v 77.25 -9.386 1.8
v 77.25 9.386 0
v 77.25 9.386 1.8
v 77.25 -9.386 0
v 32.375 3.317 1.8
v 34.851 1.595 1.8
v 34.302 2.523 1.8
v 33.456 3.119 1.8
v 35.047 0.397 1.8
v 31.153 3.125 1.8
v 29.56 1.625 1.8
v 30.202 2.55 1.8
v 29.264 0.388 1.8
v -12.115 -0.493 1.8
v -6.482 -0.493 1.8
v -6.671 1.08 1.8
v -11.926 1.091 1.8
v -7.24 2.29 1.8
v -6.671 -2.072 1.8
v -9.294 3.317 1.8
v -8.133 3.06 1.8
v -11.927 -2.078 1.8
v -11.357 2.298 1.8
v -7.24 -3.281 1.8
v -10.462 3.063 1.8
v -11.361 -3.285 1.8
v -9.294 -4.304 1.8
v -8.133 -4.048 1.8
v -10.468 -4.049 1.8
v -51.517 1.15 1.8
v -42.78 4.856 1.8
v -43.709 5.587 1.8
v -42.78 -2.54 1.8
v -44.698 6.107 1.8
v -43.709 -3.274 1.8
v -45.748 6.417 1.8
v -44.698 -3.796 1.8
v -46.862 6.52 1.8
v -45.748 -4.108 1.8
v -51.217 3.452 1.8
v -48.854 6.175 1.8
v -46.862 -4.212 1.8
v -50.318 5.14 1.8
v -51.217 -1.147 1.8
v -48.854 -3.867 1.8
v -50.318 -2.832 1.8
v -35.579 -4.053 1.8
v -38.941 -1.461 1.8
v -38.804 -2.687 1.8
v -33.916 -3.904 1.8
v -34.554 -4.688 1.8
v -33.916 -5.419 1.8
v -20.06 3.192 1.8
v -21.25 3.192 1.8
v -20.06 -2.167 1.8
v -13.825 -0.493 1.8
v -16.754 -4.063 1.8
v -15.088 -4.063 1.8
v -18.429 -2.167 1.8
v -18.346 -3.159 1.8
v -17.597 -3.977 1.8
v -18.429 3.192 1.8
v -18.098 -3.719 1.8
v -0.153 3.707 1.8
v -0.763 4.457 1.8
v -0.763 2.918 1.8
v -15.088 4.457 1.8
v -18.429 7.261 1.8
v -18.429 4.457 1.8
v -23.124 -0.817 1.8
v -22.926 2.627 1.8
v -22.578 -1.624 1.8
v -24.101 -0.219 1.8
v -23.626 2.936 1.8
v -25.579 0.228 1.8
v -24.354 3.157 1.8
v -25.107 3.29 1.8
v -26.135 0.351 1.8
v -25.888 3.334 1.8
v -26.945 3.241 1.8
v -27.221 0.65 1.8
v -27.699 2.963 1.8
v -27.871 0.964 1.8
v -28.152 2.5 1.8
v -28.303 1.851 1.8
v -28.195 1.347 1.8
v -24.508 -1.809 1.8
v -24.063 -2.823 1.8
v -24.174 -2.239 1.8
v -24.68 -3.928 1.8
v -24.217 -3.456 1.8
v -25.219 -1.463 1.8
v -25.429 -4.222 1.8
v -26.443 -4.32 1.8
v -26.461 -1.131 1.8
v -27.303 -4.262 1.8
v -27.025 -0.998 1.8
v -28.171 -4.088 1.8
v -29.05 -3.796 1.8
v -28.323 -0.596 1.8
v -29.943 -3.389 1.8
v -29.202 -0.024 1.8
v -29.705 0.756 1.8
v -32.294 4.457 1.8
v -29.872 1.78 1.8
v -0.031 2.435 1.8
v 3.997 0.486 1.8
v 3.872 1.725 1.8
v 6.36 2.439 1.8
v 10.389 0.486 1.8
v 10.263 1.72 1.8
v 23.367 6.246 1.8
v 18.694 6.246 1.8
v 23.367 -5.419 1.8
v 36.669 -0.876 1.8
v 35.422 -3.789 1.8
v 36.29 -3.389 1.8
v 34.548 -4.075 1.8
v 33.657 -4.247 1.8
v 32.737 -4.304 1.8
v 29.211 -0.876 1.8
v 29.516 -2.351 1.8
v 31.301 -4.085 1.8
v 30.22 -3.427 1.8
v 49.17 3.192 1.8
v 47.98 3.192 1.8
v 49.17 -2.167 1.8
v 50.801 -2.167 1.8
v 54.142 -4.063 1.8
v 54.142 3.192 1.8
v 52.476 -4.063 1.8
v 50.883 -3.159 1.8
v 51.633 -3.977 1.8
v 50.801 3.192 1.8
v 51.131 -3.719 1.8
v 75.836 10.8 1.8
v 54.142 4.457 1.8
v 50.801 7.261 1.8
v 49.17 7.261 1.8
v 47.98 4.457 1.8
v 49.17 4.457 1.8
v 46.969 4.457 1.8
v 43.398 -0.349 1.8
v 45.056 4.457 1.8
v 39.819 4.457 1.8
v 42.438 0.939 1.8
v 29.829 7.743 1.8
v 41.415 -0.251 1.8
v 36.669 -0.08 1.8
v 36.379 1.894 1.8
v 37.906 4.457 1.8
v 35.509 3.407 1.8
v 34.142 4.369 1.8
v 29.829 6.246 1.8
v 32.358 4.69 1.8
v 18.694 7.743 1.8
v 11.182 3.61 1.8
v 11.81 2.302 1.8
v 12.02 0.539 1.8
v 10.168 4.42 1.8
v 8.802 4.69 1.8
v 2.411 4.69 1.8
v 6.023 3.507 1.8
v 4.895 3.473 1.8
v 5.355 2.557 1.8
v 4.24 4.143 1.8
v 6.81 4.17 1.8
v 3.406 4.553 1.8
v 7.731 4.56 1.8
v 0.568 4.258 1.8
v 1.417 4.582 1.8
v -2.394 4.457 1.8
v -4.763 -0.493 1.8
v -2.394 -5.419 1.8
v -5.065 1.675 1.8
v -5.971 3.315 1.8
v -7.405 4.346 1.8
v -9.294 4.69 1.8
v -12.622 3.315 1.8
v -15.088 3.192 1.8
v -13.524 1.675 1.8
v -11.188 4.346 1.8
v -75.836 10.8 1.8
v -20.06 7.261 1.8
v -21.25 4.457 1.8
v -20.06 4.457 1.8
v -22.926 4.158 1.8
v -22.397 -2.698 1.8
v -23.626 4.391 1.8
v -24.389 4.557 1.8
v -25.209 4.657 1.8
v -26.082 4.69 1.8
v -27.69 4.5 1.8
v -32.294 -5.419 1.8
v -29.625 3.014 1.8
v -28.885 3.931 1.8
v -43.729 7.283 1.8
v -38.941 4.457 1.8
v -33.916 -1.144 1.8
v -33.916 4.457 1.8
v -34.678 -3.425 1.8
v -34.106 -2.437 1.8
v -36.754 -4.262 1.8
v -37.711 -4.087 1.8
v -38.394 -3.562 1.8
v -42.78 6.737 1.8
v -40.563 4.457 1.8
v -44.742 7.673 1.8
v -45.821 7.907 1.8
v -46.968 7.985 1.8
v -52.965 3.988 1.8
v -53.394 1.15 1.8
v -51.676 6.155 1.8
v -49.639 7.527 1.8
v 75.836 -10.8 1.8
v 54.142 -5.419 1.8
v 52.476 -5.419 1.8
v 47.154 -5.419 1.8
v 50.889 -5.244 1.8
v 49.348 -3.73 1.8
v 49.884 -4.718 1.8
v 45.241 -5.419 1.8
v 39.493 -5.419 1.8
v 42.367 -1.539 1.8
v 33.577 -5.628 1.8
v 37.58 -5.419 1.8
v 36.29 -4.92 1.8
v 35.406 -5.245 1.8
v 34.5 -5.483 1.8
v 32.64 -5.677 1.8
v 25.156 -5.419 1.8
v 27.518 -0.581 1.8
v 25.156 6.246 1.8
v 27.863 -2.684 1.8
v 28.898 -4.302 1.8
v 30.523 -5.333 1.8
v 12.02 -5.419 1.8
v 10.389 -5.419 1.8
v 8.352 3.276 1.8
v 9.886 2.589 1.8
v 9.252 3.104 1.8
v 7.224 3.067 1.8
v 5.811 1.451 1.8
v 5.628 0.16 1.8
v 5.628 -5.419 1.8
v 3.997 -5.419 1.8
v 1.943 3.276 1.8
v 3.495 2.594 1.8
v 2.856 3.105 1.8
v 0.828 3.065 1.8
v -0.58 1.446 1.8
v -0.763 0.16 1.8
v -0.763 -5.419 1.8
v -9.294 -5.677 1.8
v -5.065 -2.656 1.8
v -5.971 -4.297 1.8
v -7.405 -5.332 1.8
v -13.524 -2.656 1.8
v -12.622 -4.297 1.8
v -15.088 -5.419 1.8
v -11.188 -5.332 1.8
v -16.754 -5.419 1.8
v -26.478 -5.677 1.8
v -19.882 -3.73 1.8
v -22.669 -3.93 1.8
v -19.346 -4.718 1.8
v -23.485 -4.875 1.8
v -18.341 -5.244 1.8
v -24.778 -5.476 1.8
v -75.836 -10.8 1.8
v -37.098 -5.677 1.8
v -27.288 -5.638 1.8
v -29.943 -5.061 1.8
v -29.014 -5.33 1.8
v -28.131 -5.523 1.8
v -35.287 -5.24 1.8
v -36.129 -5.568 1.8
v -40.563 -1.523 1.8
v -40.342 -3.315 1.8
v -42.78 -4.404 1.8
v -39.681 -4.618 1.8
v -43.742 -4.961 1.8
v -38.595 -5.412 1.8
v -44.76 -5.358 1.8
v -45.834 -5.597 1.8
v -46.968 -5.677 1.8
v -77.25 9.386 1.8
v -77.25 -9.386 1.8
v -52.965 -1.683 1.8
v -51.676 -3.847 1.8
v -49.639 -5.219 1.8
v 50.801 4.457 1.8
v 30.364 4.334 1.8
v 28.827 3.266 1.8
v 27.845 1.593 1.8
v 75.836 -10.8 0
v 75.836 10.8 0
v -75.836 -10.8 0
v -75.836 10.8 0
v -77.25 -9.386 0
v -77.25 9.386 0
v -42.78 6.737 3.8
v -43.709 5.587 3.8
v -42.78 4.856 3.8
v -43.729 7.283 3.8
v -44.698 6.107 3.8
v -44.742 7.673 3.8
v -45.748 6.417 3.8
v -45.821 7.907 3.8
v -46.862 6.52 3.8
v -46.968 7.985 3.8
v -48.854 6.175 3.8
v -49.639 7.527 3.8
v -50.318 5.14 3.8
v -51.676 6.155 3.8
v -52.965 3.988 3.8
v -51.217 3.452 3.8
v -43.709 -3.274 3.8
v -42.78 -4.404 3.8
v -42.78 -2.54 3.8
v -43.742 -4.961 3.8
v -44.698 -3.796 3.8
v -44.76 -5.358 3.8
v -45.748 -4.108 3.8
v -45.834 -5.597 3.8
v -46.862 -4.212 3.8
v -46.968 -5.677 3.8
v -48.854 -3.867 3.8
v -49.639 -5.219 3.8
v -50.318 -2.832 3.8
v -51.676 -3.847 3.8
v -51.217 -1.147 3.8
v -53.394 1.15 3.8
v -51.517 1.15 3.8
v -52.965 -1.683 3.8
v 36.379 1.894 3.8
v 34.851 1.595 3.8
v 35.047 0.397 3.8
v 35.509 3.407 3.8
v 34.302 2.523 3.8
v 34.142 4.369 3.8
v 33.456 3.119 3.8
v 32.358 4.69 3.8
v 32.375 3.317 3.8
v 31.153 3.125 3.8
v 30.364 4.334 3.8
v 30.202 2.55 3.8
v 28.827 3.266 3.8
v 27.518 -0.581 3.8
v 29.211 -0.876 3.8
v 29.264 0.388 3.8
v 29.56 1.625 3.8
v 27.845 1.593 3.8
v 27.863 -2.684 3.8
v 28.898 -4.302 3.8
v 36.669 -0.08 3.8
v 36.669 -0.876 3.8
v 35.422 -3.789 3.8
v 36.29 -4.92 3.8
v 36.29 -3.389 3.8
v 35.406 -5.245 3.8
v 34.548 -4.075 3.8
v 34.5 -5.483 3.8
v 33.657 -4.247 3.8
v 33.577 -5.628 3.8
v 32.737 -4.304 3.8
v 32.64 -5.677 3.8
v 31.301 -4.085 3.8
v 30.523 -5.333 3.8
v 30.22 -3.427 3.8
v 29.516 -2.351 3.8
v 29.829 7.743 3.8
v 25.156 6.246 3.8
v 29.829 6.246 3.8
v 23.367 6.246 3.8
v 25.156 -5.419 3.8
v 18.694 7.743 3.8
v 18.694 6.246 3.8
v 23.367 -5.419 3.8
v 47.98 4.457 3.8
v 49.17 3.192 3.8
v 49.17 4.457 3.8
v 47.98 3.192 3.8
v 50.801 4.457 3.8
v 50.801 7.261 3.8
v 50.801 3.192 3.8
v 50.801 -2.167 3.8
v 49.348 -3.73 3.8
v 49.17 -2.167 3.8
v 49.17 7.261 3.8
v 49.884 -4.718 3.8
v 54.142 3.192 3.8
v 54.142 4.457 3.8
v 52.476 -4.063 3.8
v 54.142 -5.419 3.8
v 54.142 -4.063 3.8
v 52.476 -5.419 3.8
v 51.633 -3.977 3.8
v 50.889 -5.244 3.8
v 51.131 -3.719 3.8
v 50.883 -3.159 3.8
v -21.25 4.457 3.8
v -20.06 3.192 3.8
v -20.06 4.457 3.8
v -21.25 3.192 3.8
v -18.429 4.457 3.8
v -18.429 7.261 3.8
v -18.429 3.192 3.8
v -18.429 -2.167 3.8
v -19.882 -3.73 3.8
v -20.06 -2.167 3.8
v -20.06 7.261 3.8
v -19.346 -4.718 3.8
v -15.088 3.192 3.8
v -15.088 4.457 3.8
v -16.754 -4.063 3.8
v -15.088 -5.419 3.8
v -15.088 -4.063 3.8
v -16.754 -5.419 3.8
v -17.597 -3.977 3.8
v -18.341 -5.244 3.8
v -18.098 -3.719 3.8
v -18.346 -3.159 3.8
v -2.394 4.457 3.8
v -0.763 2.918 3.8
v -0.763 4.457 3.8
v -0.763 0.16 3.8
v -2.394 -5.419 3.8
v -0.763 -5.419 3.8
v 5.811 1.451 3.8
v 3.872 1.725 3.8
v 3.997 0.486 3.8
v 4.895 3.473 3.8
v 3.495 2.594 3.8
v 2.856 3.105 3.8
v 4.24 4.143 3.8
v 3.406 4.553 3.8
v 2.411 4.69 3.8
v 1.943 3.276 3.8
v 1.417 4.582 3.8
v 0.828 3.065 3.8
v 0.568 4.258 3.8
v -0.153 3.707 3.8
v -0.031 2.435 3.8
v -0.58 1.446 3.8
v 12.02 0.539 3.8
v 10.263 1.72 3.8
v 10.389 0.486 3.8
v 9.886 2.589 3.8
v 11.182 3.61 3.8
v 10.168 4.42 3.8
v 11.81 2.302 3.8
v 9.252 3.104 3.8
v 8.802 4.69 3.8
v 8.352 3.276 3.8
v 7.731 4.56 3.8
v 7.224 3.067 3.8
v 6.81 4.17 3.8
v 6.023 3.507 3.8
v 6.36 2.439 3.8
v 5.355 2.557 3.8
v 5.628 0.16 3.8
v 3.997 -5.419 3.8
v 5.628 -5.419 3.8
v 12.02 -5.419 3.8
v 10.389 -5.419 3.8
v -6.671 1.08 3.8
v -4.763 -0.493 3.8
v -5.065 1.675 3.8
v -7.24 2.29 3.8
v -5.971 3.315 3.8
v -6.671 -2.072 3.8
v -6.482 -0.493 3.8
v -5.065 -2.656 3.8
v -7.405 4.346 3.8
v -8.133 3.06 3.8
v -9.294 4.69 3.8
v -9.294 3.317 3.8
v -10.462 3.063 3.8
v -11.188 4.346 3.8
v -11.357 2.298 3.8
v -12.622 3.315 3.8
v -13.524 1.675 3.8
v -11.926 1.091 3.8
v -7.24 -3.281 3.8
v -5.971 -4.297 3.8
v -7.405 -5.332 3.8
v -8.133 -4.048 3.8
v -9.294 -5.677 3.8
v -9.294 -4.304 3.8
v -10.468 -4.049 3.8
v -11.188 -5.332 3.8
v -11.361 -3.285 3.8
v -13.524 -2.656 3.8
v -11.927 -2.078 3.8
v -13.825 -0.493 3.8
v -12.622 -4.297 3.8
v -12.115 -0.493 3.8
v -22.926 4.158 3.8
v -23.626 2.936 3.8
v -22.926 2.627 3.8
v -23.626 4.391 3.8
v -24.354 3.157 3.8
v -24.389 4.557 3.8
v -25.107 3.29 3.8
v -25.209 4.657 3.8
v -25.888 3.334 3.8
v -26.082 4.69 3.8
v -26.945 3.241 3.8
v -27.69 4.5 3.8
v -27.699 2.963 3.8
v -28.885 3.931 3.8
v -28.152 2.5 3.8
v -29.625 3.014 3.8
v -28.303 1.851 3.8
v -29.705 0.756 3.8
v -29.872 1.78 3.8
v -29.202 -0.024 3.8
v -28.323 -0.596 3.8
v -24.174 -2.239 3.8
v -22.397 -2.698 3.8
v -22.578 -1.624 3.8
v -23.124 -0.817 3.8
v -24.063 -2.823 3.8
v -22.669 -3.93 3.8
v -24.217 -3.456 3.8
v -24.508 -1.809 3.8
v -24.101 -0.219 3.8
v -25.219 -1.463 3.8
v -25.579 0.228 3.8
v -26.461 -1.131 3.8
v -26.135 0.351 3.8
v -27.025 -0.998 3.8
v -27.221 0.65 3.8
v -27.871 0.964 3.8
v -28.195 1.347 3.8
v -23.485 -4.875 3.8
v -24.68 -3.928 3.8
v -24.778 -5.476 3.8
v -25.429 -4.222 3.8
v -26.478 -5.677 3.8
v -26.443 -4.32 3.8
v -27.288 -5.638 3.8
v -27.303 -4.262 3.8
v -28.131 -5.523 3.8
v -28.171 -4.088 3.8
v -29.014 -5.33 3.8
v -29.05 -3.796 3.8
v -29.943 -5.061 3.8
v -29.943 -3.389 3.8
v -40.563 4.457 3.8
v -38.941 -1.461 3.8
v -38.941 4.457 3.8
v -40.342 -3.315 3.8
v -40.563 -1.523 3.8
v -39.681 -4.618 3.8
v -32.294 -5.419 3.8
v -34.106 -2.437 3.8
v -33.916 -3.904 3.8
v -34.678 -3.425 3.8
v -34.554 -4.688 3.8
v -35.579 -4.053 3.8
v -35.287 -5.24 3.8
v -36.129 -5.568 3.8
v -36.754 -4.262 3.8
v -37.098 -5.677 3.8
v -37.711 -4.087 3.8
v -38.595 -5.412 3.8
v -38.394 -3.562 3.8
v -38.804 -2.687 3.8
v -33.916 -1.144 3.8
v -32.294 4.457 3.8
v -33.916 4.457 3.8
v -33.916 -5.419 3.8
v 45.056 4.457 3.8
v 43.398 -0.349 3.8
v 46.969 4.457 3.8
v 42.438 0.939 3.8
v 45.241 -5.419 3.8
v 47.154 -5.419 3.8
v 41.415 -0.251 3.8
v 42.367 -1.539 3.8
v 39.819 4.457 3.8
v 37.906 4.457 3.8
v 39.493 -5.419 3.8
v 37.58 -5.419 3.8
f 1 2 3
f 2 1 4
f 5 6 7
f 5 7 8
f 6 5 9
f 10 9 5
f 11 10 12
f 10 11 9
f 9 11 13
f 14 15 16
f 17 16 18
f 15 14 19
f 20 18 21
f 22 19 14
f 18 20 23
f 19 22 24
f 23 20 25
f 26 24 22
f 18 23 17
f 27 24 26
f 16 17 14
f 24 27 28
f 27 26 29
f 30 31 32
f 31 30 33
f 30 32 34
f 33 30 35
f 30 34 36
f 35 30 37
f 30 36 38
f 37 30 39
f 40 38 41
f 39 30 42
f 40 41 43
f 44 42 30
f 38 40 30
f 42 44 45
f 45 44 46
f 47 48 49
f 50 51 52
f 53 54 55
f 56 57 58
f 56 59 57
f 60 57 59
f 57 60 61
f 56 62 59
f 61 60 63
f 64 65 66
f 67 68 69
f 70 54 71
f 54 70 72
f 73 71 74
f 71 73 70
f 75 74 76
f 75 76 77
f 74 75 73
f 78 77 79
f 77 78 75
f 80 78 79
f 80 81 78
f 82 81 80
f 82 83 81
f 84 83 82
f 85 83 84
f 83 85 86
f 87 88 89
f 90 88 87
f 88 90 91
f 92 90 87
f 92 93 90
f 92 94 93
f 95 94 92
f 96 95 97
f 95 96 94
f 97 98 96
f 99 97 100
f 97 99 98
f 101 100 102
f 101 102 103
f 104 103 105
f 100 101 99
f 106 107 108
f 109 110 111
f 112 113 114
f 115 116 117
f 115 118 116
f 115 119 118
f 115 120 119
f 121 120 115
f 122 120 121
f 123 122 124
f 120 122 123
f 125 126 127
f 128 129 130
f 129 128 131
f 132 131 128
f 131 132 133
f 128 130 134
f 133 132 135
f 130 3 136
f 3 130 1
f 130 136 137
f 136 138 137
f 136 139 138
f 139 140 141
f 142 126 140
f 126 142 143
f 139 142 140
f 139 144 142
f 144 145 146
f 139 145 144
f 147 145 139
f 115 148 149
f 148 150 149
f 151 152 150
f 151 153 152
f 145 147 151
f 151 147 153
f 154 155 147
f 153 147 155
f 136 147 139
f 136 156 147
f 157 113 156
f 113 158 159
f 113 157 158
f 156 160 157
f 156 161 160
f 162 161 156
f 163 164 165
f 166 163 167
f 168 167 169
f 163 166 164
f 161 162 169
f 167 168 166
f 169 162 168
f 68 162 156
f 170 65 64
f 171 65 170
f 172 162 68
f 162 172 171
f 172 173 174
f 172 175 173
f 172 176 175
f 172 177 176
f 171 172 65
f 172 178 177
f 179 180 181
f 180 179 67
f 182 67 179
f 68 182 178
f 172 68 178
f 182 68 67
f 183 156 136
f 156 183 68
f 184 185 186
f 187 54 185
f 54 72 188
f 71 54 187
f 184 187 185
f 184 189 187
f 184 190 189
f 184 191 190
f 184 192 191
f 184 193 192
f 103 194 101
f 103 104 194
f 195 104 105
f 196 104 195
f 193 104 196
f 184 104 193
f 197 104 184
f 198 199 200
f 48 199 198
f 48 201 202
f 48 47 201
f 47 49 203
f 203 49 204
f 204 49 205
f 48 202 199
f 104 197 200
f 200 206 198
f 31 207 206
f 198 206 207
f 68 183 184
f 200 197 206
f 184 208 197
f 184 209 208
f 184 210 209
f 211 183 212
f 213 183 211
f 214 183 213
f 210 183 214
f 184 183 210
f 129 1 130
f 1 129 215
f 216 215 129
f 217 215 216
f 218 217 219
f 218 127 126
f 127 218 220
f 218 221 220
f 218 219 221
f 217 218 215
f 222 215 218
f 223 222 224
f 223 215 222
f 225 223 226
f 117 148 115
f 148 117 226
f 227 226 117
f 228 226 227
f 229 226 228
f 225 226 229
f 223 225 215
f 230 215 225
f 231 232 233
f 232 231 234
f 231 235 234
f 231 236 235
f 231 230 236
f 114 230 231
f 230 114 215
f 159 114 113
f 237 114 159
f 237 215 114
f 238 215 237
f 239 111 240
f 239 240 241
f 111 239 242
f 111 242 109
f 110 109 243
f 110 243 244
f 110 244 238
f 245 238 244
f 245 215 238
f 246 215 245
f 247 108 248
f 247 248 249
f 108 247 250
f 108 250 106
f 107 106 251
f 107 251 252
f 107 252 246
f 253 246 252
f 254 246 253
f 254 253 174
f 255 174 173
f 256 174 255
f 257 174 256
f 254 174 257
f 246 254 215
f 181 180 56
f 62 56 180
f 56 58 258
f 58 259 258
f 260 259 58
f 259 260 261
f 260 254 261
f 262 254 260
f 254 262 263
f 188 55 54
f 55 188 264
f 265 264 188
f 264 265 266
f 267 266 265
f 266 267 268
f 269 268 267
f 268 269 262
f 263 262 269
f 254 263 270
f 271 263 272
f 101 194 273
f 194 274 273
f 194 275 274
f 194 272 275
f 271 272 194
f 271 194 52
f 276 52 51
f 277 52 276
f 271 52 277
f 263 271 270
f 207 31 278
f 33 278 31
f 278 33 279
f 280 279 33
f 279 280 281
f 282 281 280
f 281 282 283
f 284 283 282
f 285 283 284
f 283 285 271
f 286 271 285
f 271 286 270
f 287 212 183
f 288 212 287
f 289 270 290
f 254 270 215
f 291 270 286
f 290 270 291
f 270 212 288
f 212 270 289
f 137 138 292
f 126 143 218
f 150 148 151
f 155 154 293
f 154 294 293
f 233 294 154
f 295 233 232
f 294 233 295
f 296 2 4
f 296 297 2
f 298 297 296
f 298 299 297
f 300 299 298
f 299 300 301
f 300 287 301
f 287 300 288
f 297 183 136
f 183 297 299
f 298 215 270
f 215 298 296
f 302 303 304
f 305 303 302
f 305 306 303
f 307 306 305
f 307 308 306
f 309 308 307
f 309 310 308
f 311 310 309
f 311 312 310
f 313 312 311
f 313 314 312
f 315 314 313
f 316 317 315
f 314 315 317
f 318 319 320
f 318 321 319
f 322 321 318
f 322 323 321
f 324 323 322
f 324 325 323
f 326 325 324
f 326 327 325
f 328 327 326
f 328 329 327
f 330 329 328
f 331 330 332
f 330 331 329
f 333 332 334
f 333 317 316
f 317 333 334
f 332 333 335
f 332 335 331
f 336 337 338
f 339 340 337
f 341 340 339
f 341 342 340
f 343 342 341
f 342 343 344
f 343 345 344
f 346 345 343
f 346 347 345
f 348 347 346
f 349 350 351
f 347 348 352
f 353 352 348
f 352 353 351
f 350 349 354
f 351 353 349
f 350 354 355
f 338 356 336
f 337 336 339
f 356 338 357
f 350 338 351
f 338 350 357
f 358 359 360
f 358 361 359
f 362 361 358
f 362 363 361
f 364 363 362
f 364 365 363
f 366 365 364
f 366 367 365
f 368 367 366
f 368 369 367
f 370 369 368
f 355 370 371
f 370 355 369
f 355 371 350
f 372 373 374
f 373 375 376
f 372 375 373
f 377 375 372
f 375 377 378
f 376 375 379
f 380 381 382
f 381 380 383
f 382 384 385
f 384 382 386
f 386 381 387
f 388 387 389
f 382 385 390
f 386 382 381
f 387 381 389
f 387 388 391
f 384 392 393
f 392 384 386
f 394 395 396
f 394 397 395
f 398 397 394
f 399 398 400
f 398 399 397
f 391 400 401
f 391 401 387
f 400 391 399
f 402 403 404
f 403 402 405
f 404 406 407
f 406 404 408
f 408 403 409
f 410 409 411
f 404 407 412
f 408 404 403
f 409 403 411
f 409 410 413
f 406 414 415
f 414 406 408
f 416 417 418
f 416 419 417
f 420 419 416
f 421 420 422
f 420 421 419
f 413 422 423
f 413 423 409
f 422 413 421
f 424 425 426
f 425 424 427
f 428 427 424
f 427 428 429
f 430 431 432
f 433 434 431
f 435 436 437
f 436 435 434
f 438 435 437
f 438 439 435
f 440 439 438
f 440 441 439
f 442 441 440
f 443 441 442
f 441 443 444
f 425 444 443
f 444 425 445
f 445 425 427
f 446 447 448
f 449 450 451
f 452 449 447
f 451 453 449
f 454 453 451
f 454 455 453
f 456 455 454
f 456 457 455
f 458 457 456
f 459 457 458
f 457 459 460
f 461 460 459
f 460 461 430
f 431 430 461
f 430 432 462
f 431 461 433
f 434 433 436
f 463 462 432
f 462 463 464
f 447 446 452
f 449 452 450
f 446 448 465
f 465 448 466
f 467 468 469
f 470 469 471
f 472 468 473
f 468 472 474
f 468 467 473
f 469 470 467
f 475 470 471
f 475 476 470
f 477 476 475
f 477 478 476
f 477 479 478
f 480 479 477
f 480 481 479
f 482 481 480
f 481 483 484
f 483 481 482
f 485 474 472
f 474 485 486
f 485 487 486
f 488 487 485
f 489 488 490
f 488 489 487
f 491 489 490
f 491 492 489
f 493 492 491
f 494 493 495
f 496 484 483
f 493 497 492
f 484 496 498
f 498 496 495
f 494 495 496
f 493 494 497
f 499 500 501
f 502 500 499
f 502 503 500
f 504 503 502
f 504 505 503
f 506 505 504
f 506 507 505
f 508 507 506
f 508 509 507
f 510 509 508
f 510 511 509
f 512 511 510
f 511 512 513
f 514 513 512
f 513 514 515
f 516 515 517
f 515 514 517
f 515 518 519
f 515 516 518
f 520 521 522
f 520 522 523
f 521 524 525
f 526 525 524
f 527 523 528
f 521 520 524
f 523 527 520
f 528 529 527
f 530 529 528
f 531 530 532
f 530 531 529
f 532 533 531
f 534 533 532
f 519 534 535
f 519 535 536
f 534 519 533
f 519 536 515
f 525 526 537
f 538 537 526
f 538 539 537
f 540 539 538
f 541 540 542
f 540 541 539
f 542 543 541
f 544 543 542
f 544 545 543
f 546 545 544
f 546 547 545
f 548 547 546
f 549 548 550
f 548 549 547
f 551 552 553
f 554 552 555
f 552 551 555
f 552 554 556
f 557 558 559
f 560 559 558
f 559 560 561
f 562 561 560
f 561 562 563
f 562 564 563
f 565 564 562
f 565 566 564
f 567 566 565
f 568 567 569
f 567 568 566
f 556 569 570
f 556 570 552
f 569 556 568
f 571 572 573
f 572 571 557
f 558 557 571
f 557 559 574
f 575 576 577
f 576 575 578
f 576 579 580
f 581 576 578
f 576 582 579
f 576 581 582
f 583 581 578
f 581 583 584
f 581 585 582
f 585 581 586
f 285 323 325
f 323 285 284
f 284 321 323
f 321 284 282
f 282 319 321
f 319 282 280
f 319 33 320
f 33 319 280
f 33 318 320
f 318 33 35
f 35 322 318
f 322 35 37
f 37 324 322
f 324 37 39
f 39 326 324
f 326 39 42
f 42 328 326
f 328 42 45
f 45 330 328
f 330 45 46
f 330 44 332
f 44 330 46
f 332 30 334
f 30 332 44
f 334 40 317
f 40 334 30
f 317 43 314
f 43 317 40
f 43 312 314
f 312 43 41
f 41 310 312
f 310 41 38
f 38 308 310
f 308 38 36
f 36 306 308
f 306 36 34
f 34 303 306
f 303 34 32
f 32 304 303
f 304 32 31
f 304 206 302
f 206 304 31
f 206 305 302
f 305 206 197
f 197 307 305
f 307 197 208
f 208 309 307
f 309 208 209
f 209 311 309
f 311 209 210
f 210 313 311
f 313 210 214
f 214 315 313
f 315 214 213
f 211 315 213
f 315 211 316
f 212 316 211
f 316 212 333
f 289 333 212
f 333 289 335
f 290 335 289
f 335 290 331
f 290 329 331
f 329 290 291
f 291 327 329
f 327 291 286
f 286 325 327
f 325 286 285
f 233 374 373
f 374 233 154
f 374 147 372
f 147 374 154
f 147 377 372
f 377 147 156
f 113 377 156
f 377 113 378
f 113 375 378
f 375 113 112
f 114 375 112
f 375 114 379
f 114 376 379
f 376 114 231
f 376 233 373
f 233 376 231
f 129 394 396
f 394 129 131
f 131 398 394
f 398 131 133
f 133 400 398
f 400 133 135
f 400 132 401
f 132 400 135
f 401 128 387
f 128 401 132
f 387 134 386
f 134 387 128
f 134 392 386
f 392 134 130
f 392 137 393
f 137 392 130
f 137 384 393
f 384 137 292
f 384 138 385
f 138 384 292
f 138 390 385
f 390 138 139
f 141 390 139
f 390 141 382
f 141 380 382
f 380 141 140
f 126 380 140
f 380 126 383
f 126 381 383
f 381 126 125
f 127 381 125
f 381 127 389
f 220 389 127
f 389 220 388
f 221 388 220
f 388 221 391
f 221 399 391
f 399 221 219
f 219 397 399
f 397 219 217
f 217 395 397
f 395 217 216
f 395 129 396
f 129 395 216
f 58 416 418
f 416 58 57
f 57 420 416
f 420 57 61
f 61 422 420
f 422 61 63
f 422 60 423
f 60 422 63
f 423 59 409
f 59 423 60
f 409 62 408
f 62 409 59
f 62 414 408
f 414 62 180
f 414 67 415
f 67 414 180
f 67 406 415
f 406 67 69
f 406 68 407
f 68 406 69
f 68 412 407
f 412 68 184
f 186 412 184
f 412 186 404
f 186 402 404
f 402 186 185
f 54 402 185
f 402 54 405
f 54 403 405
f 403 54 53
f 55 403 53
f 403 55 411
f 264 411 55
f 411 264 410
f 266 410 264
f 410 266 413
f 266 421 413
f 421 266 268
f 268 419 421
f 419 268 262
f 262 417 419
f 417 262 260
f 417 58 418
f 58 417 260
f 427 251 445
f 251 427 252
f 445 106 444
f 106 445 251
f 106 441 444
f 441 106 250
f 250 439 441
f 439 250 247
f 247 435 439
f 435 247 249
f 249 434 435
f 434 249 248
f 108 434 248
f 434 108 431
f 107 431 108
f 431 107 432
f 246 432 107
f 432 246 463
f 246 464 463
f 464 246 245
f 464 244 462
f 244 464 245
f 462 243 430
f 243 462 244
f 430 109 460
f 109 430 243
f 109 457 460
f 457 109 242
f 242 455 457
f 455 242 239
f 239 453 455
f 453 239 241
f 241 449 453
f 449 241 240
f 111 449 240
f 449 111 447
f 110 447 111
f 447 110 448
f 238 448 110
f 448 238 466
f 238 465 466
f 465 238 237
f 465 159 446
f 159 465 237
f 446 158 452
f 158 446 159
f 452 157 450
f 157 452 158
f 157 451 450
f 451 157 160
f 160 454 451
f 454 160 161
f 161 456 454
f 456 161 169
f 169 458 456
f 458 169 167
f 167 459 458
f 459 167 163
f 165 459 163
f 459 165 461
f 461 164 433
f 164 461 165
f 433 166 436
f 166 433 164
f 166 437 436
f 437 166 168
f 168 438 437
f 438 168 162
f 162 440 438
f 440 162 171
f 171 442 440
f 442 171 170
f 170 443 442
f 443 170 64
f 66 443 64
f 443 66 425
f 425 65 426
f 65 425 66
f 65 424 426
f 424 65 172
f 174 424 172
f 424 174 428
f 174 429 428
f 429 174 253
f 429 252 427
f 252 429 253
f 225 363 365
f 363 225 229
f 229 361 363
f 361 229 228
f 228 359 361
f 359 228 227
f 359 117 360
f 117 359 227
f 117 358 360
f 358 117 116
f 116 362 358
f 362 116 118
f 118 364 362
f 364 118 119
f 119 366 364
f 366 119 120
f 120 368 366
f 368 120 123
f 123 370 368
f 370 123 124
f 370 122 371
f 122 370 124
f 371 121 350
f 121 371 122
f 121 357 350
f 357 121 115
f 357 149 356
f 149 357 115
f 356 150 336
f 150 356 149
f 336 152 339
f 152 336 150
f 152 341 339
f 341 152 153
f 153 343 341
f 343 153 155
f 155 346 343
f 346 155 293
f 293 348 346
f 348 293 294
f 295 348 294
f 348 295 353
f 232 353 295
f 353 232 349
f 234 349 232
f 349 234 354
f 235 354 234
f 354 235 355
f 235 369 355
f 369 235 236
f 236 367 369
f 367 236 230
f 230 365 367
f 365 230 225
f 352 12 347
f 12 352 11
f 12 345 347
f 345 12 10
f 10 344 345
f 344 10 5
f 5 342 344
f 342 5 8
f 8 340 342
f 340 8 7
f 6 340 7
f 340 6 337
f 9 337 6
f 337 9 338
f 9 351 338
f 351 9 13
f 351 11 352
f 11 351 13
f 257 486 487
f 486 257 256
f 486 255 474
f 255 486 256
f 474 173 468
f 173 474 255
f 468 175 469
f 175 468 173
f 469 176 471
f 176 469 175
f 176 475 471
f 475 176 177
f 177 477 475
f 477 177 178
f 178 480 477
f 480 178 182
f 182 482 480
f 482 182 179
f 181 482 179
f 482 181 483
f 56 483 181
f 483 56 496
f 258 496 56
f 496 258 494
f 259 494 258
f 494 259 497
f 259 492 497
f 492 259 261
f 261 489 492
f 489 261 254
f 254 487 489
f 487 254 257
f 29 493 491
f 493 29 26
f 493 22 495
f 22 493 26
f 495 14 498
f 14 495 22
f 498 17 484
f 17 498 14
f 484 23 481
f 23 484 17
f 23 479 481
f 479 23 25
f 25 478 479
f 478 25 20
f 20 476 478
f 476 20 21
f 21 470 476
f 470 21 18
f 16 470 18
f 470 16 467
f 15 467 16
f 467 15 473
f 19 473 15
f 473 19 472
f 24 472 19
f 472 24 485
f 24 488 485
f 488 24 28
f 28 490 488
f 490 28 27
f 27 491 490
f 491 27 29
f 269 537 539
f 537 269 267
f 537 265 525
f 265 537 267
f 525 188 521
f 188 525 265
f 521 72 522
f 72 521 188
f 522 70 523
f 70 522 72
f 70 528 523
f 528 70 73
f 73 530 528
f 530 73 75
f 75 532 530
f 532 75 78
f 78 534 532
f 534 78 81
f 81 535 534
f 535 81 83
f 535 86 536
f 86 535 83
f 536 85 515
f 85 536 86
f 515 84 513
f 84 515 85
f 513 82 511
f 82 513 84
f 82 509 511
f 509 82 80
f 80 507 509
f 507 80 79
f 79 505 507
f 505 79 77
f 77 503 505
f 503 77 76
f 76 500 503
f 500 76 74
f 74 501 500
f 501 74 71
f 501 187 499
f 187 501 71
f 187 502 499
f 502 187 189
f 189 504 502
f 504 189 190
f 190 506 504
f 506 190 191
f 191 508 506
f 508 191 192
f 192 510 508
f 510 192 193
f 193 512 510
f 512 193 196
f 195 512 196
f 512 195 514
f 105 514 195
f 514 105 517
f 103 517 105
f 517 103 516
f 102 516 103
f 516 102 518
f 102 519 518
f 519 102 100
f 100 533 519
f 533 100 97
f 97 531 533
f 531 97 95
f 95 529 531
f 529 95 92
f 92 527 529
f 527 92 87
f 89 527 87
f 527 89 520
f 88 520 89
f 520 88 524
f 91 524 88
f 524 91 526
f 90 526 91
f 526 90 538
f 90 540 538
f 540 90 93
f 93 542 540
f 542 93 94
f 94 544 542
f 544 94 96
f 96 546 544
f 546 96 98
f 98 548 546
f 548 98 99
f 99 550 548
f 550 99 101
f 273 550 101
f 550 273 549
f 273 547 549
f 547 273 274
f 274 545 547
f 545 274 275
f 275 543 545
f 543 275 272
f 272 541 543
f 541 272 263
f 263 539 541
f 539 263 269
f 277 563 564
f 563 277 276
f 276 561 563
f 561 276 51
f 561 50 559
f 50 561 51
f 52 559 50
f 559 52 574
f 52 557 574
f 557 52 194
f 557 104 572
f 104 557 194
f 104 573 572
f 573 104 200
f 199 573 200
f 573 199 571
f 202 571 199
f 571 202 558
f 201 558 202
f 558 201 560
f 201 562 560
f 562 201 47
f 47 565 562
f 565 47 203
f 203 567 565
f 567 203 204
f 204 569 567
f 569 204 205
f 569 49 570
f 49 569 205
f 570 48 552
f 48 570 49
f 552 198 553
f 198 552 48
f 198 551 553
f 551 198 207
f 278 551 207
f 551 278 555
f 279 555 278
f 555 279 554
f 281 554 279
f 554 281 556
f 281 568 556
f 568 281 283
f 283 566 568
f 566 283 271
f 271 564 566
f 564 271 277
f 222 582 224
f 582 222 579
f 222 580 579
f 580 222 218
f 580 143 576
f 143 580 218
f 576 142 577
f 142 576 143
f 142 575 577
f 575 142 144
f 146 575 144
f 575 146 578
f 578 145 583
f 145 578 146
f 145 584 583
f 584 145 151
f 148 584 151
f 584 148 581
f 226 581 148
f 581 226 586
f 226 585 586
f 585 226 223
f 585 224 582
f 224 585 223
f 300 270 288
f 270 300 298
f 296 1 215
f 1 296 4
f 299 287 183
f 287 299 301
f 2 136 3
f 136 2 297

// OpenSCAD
// preview[view:south, tilt:top]

/* [General Settings] */

label_text = "Custom Text";
//Cut/Extrude distance (mm). A negative value creates inset text, a positive value creates extruded text.
extrude_distance = 2; // [-1.8:0.1:4.1]

// Does not apply to text that is cut all the way through the label, which is hardcoded to use a stencil font (Allerta Stencil). When set to Braille, the "#" symbol can be used for the dots-3456 number indicator. 
font_type = 5; //[6:Braille, 5:Allerta (Sans Serif), 4:Roboto (Sans Serif), 3:Delius (Handwriting), 2:Courgette (Handwriting), 1:Comfortaa (Display), 0:Righteous (Display)] 

font_size = 13; //[8:0.5:15]

/* [Braille Settings] */
//Dot radius and height (mm). The rest of the Braille parameters are set according to the Marburg Medium Braille font standard
dot_radius = 0.8; // [0.5:0.1:1]
//Extra offset from left (mm).
braille_x_offset = 0;
//Extra offset from top (mm).
braille_y_offset = 0;


/* [Adjustments] */
//Adjust these parameters if the label has trouble fitting in the groove of the 3D printed handle. (All mm)
label_thickness = 1.8; // [1.4:0.1:1.8]
label_width = 154.5;
label_height = 21.6;
chamfer_size = 2;


/* [Hidden] */
$fn = 10;
//More braille settings
spacing = 2.5;
distance = 3.5 + spacing;
char_count = len(label_text);

//Sans Serif fonts

module text_cut_through(input_text) { //Converts text for cutting all the way through label (uses Allerta stencil font)
	linear_extrude(height = (-extrude_distance)+0.02) {
		text(label_text, size = font_size, font = "Allerta Stencil:style=Regular", halign = "center", valign = "center");
	}
}

module text_cutter_allerta(input_text) { //Converts text (Allerta font) from 2D to 3D for cutting
	linear_extrude(height = (-extrude_distance)+0.02) {
		text(label_text, size = font_size, font = "Allerta:style=Regular", halign = "center", valign = "center");
	}
}

module text_extruder_allerta(input_text) { //Converts text (Allerta font) from 2D to 3D for extrusion
	linear_extrude(height = extrude_distance) {
		text(label_text, size = font_size, font = "Allerta:style=Regular", halign = "center", valign = "center");
	}
}

module text_cutter_roboto(input_text) { //Converts text (Roboto font) from 2D to 3D for cutting
	linear_extrude(height = (-extrude_distance)+0.02) {
		text(label_text, size = font_size, font = "Roboto:style=Regular", halign = "center", valign = "center");
	}
}

module text_extruder_roboto(input_text) { //Converts text (Roboto font) from 2D to 3D for extrusion
	linear_extrude(height = extrude_distance) {
		text(label_text, size = font_size, font = "Roboto:style=Regular", halign = "center", valign = "center");
	}
}

//Handwriting fonts

module text_cutter_delius(input_text) { //Converts text (Delius font) from 2D to 3D for cutting
	linear_extrude(height = (-extrude_distance)+0.02) {
		text(label_text, size = font_size, font = "Delius:style=Regular", halign = "center", valign = "center");
	}
}

module text_extruder_delius(input_text) { //Converts text (Delius font) from 2D to 3D for extrusion
	linear_extrude(height = extrude_distance) {
		text(label_text, size = font_size, font = "Delius:style=Regular", halign = "center", valign = "center");
	}
}

module text_cutter_courgette(input_text) { //Converts text (Courgette font) from 2D to 3D for cutting
	linear_extrude(height = (-extrude_distance)+0.02) {
		text(label_text, size = font_size, font = "Courgette:style=Regular", halign = "center", valign = "center");
	}
}

module text_extruder_courgette(input_text) { //Converts text (Courgette font) from 2D to 3D for extrusion
	linear_extrude(height = extrude_distance) {
		text(label_text, size = font_size, font = "Courgette:style=Regular", halign = "center", valign = "center");
	}
}

//Display fonts

module text_cutter_comfortaa(input_text) { //Converts text (Comfortaa font) from 2D to 3D for cutting
	linear_extrude(height = (-extrude_distance)+0.02) {
		text(label_text, size = font_size, font = "Comfortaa:style=Regular", halign = "center", valign = "center");
	}
}

module text_extruder_comfortaa(input_text) { //Converts text (Comfortaa font) from 2D to 3D for extrusion
	linear_extrude(height = extrude_distance) {
		text(label_text, size = font_size, font = "Comfortaa:style=Regular", halign = "center", valign = "center");
	}
}

module text_cutter_righteous(input_text) { //Converts text (Righteous font) from 2D to 3D for cutting
	linear_extrude(height = (-extrude_distance)+0.02) {
		text(label_text, size = font_size, font = "Righteous:style=Regular", halign = "center", valign = "center");
	}
}

module text_extruder_righteous(input_text) { //Converts text (Righteous font) from 2D to 3D for extrusion
	linear_extrude(height = extrude_distance) {
		text(label_text, size = font_size, font = "Righteous:style=Regular", halign = "center", valign = "center");
	}
}


/*
Braille Module
http://creativecommons.org/licenses/by/3.0/
*/

module letter(bitmap) {
	row_size = 2;
	col_size = 3;
	bitmap_size = row_size * col_size;
	
	function loc_x(loc) = floor(loc / row_size) * spacing + spacing;
	function loc_y(loc) = loc % row_size * spacing  + (distance-spacing)/2;

	for (loc = [0:bitmap_size - 1]) {
		if (bitmap[loc] != 0) {
			union() {
				translate(v = [loc_x(loc), loc_y(loc), 0]) {
					sphere(dot_radius, center = true);
				}
			}
		}
	}
}

module braille_char(char) {
	if (char == "A" || char == "a") {
		letter([
			1,0,
			0,0,
			0,0
		]);
	} else if (char == "B" || char == "b") {
		letter([
			1,0,
			1,0,
			0,0
		]);
	} else if (char == "C" || char == "c") {
		letter([
			1,1,
			0,0,
			0,0
		]);
	} else if (char == "D" || char == "d") {
		letter([
			1,1,
			0,1,
			0,0
		]);
	} else if (char == "E" || char == "e") {
		letter([
			1,0,
			0,1,
			0,0
		]);
	} else if (char == "F" || char == "f") {
		letter([
			1,1,
			1,0,
			0,0
		]);
	} else if (char == "G" || char == "g") {
		letter([
			1,1,
			1,1,
			0,0
		]);
	} else if (char == "H" || char == "h") {
		letter([
			1,0,
			1,1,
			0,0
		]);
	} else if (char == "I" || char == "i") {
		letter([
			0,1,
			1,0,
			0,0
		]);
	} else if (char == "J" || char == "j") {
		letter([
			0,1,
			1,1,
			0,0
		]);
	} else if (char == "K" || char == "k") {
		letter([
			1,0,
			0,0,
			1,0
		]);
	} else if (char == "L" || char == "l") {
		letter([
			1,0,
			1,0,
			1,0
		]);
	} else if (char == "M" || char == "m") {
		letter([
			1,1,
			0,0,
			1,0
		]);
	} else if (char == "N" || char == "n") {
		letter([
			1,1,
			0,1,
			1,0
		]);
	} else if (char == "O" || char == "o") {
		letter([
			1,0,
			0,1,
			1,0
		]);
	} else if (char == "P" || char == "p") {
		letter([
			1,1,
			1,0,
			1,0
		]);
	} else if (char == "Q" || char == "q") {
		letter([
			1,1,
			1,1,
			1,0
		]);
	} else if (char == "R" || char == "r") {
		letter([
			1,0,
			1,1,
			1,0
		]);
	} else if (char == "S" || char == "s") {
		letter([
			0,1,
			1,0,
			1,0
		]);
	} else if (char == "T" || char == "t") {
		letter([
			0,1,
			1,1,
			1,0
		]);
	} else if (char == "U" || char == "u") {
		letter([
			1,0,
			0,0,
			1,1
		]);
	} else if (char == "V" || char == "v") {
		letter([
			1,0,
			1,1,
			1,0
		]);
	} else if (char == "W" || char == "w") {
		letter([
			0,1,
			1,1,
			0,1
		]);
	} else if (char == "X" || char == "x") {
		letter([
			1,1,
			0,0,
			1,1
		]);
	} else if (char == "Y" || char == "y") {
		letter([
			1,1,
			0,1,
			1,1
		]);
	} else if (char == "Z" || char == "z") {
		letter([
			1,0,
			0,1,
			1,1
		]);
	} else if (char == " ") {
		letter([
			0,0,
			0,0,
			0,0
		]);
	} else if (char == "#") {
		letter([
			0,1,
			0,1,
			1,1
		]);        
	} else if (char == "0") {
		letter([
			0,1,
			1,1,
			0,0
		]);
	} else if (char == "1") {
		letter([
			1,0,
			0,0,
			0,0
		]);
	} else if (char == "2") {
		letter([
			1,0,
			1,0,
			0,0
		]);
	} else if (char == "3") {
		letter([
			1,1,
			0,0,
			0,0
		]);
	} else if (char == "4") {
		letter([
			1,1,
			0,1,
			0,0
		]);
	} else if (char == "5") {
		letter([
			1,0,
			0,1,
			0,0
		]);
	} else if (char == "6") {
		letter([
			1,1,
			1,0,
			0,0
		]);
	} else if (char == "7") {
		letter([
			1,1,
			1,1,
			0,0
		]);
	} else if (char == "8") {
		letter([
			1,0,
			1,1,
			0,0
		]);
	} else if (char == "9") {
		letter([
			0,1,
			1,0,
			0,0
		]);
	} else {
		echo("Invalid Character: ", char);
	}

}

module braille_str(label_text, char_count) {
	union() {
		for (count = [0:char_count-1]) {
			translate(v = [0, count * distance, 0]) {
				braille_char(label_text[count]);
			}
		}
	}
}

module chamfers(w, h, t, ch_s){ //generates chamfers for label (takes label width, height, thickness and chamfer size as parameters)
    union() {
            translate([-w/2, -h/2, t/2]) rotate([0,0,45]) cube([ch_s,ch_s,t+1], true);
            translate([w/2, -h/2, t/2]) rotate([0,0,45]) cube([ch_s,ch_s,t+1], true);
            translate([-w/2, h/2, t/2]) rotate([0,0,45]) cube([ch_s,ch_s,t+1], true);
            translate([w/2, h/2, t/2]) rotate([0,0,45]) cube([ch_s,ch_s,t+1], true);
    }
}


if(font_type == 6){ //Extrude Braille
    difference() {
        union() {
            translate([0,0,label_thickness/2]) cube([label_width, label_height, label_thickness], true);
            translate([(-(label_width/2)+12+braille_x_offset),((label_height/2)-braille_y_offset),label_thickness]) rotate([0,0,-90]) braille_str(label_text, char_count);
        }
        
        chamfers(label_width, label_height, label_thickness, chamfer_size);
    }
}

else if(extrude_distance < 0 && (abs(extrude_distance) >= label_thickness)){ //Cut Allerta Stencil font text through label
    
    difference() {
        translate([0,0,label_thickness/2]) cube([label_width, label_height, label_thickness], true);
        
        union() {
            translate([0, 1, (label_thickness+extrude_distance-0.01)]) text_cut_through(label_text) ;
            chamfers(label_width, label_height, label_thickness, chamfer_size);
        }
    }
}

else if(extrude_distance < 0 && font_type == 5){ //Cut Allerta font text into label
    
    difference() {
        translate([0,0,label_thickness/2]) cube([label_width, label_height, label_thickness], true);
        
        union() {
            translate([0, 1, (label_thickness+extrude_distance-0.01)]) text_cutter_allerta(label_text) ;
            chamfers(label_width, label_height, label_thickness, chamfer_size);
       }
    }
}

else if(extrude_distance < 0 && font_type == 4){ //Cut Roboto font text into label
    
    difference() {
        translate([0,0,label_thickness/2]) cube([label_width, label_height, label_thickness], true);
        
        union() {
            translate([0, 1, (label_thickness+extrude_distance-0.01)]) text_cutter_roboto(label_text) ;
            chamfers(label_width, label_height, label_thickness, chamfer_size);
       }
    }
}

else if(extrude_distance < 0 && font_type == 3){ //Cut Delius font text into label
    
    difference() {
        translate([0,0,label_thickness/2]) cube([label_width, label_height, label_thickness], true);
        
        union() {
            translate([0, 1, (label_thickness+extrude_distance-0.01)]) text_cutter_delius(label_text) ;
            chamfers(label_width, label_height, label_thickness, chamfer_size);
       }
    }
}

else if(extrude_distance < 0 && font_type == 2){ //Cut Courgette font text into label
    
    difference() {
        translate([0,0,label_thickness/2]) cube([label_width, label_height, label_thickness], true);
        
        union() {
            translate([0, 1, (label_thickness+extrude_distance-0.01)]) text_cutter_courgette(label_text) ;
            chamfers(label_width, label_height, label_thickness, chamfer_size);
       }
    }
}

else if(extrude_distance < 0 && font_type == 1){ //Cut Comfortaa font text into label
    
    difference() {
        translate([0,0,label_thickness/2]) cube([label_width, label_height, label_thickness], true);
        
        union() {
            translate([0, 1, (label_thickness+extrude_distance-0.01)]) text_cutter_comfortaa(label_text) ;
            chamfers(label_width, label_height, label_thickness, chamfer_size);
       }
    }
}

else if(extrude_distance < 0 && font_type == 0){ //Cut Righteous font text into label
    
    difference() {
        translate([0,0,label_thickness/2]) cube([label_width, label_height, label_thickness], true);
        
        union() {
            translate([0, 1, (label_thickness+extrude_distance-0.01)]) text_cutter_righteous(label_text) ;
            chamfers(label_width, label_height, label_thickness, chamfer_size);
       }
    }
}

else if(extrude_distance == 0) {//If text is enabled and set to 0 height, create blank label
    difference() {
        translate([0,0,label_thickness/2]) cube([label_width, label_height, label_thickness], true);
        
        chamfers(label_width, label_height, label_thickness, chamfer_size);
    }    
}

else if(extrude_distance > 0 && font_type == 5){ //Extrude Allerta font text

    
    difference() {
        union() {
            translate([0,0,label_thickness/2]) cube([label_width, label_height, label_thickness], true);
            translate([0, 1, label_thickness]) text_extruder_allerta(label_text) ;     
        }
        
        chamfers(label_width, label_height, label_thickness, chamfer_size);
    }
}

else if(extrude_distance > 0 && font_type == 4){ //Extrude Roboto font text

    
    difference() {
        union() {
            translate([0,0,label_thickness/2]) cube([label_width, label_height, label_thickness], true);
            translate([0, 1, label_thickness]) text_extruder_roboto(label_text) ;     
        }
        
        chamfers(label_width, label_height, label_thickness, chamfer_size);
    }
}


else if(extrude_distance > 0 && font_type == 3){ //Extrude Delius font text

    
    difference() {
        union() {
            translate([0,0,label_thickness/2]) cube([label_width, label_height, label_thickness], true);
            translate([0, 1, label_thickness]) text_extruder_delius(label_text) ;     
        }
        
        chamfers(label_width, label_height, label_thickness, chamfer_size);
    }
}

else if(extrude_distance > 0 && font_type == 2){ //Extrude Courgette font text

    
    difference() {
        union() {
            translate([0,0,label_thickness/2]) cube([label_width, label_height, label_thickness], true);
            translate([0, 1, label_thickness]) text_extruder_courgette(label_text) ;     
        }
        
        chamfers(label_width, label_height, label_thickness, chamfer_size);
    }
}

else if(extrude_distance > 0 && font_type == 1){ //Extrude Comfortaa font text

    
    difference() {
        union() {
            translate([0,0,label_thickness/2]) cube([label_width, label_height, label_thickness], true);
            translate([0, 1, label_thickness]) text_extruder_comfortaa(label_text) ;     
        }
        
        chamfers(label_width, label_height, label_thickness, chamfer_size);
    }
}

else if(extrude_distance > 0 && font_type == 0){ //Extrude Righteous font text

    
    difference() {
        union() {
            translate([0,0,label_thickness/2]) cube([label_width, label_height, label_thickness], true);
            translate([0, 1, label_thickness]) text_extruder_righteous(label_text) ;     
        }
        
        chamfers(label_width, label_height, label_thickness, chamfer_size);
    }
}
